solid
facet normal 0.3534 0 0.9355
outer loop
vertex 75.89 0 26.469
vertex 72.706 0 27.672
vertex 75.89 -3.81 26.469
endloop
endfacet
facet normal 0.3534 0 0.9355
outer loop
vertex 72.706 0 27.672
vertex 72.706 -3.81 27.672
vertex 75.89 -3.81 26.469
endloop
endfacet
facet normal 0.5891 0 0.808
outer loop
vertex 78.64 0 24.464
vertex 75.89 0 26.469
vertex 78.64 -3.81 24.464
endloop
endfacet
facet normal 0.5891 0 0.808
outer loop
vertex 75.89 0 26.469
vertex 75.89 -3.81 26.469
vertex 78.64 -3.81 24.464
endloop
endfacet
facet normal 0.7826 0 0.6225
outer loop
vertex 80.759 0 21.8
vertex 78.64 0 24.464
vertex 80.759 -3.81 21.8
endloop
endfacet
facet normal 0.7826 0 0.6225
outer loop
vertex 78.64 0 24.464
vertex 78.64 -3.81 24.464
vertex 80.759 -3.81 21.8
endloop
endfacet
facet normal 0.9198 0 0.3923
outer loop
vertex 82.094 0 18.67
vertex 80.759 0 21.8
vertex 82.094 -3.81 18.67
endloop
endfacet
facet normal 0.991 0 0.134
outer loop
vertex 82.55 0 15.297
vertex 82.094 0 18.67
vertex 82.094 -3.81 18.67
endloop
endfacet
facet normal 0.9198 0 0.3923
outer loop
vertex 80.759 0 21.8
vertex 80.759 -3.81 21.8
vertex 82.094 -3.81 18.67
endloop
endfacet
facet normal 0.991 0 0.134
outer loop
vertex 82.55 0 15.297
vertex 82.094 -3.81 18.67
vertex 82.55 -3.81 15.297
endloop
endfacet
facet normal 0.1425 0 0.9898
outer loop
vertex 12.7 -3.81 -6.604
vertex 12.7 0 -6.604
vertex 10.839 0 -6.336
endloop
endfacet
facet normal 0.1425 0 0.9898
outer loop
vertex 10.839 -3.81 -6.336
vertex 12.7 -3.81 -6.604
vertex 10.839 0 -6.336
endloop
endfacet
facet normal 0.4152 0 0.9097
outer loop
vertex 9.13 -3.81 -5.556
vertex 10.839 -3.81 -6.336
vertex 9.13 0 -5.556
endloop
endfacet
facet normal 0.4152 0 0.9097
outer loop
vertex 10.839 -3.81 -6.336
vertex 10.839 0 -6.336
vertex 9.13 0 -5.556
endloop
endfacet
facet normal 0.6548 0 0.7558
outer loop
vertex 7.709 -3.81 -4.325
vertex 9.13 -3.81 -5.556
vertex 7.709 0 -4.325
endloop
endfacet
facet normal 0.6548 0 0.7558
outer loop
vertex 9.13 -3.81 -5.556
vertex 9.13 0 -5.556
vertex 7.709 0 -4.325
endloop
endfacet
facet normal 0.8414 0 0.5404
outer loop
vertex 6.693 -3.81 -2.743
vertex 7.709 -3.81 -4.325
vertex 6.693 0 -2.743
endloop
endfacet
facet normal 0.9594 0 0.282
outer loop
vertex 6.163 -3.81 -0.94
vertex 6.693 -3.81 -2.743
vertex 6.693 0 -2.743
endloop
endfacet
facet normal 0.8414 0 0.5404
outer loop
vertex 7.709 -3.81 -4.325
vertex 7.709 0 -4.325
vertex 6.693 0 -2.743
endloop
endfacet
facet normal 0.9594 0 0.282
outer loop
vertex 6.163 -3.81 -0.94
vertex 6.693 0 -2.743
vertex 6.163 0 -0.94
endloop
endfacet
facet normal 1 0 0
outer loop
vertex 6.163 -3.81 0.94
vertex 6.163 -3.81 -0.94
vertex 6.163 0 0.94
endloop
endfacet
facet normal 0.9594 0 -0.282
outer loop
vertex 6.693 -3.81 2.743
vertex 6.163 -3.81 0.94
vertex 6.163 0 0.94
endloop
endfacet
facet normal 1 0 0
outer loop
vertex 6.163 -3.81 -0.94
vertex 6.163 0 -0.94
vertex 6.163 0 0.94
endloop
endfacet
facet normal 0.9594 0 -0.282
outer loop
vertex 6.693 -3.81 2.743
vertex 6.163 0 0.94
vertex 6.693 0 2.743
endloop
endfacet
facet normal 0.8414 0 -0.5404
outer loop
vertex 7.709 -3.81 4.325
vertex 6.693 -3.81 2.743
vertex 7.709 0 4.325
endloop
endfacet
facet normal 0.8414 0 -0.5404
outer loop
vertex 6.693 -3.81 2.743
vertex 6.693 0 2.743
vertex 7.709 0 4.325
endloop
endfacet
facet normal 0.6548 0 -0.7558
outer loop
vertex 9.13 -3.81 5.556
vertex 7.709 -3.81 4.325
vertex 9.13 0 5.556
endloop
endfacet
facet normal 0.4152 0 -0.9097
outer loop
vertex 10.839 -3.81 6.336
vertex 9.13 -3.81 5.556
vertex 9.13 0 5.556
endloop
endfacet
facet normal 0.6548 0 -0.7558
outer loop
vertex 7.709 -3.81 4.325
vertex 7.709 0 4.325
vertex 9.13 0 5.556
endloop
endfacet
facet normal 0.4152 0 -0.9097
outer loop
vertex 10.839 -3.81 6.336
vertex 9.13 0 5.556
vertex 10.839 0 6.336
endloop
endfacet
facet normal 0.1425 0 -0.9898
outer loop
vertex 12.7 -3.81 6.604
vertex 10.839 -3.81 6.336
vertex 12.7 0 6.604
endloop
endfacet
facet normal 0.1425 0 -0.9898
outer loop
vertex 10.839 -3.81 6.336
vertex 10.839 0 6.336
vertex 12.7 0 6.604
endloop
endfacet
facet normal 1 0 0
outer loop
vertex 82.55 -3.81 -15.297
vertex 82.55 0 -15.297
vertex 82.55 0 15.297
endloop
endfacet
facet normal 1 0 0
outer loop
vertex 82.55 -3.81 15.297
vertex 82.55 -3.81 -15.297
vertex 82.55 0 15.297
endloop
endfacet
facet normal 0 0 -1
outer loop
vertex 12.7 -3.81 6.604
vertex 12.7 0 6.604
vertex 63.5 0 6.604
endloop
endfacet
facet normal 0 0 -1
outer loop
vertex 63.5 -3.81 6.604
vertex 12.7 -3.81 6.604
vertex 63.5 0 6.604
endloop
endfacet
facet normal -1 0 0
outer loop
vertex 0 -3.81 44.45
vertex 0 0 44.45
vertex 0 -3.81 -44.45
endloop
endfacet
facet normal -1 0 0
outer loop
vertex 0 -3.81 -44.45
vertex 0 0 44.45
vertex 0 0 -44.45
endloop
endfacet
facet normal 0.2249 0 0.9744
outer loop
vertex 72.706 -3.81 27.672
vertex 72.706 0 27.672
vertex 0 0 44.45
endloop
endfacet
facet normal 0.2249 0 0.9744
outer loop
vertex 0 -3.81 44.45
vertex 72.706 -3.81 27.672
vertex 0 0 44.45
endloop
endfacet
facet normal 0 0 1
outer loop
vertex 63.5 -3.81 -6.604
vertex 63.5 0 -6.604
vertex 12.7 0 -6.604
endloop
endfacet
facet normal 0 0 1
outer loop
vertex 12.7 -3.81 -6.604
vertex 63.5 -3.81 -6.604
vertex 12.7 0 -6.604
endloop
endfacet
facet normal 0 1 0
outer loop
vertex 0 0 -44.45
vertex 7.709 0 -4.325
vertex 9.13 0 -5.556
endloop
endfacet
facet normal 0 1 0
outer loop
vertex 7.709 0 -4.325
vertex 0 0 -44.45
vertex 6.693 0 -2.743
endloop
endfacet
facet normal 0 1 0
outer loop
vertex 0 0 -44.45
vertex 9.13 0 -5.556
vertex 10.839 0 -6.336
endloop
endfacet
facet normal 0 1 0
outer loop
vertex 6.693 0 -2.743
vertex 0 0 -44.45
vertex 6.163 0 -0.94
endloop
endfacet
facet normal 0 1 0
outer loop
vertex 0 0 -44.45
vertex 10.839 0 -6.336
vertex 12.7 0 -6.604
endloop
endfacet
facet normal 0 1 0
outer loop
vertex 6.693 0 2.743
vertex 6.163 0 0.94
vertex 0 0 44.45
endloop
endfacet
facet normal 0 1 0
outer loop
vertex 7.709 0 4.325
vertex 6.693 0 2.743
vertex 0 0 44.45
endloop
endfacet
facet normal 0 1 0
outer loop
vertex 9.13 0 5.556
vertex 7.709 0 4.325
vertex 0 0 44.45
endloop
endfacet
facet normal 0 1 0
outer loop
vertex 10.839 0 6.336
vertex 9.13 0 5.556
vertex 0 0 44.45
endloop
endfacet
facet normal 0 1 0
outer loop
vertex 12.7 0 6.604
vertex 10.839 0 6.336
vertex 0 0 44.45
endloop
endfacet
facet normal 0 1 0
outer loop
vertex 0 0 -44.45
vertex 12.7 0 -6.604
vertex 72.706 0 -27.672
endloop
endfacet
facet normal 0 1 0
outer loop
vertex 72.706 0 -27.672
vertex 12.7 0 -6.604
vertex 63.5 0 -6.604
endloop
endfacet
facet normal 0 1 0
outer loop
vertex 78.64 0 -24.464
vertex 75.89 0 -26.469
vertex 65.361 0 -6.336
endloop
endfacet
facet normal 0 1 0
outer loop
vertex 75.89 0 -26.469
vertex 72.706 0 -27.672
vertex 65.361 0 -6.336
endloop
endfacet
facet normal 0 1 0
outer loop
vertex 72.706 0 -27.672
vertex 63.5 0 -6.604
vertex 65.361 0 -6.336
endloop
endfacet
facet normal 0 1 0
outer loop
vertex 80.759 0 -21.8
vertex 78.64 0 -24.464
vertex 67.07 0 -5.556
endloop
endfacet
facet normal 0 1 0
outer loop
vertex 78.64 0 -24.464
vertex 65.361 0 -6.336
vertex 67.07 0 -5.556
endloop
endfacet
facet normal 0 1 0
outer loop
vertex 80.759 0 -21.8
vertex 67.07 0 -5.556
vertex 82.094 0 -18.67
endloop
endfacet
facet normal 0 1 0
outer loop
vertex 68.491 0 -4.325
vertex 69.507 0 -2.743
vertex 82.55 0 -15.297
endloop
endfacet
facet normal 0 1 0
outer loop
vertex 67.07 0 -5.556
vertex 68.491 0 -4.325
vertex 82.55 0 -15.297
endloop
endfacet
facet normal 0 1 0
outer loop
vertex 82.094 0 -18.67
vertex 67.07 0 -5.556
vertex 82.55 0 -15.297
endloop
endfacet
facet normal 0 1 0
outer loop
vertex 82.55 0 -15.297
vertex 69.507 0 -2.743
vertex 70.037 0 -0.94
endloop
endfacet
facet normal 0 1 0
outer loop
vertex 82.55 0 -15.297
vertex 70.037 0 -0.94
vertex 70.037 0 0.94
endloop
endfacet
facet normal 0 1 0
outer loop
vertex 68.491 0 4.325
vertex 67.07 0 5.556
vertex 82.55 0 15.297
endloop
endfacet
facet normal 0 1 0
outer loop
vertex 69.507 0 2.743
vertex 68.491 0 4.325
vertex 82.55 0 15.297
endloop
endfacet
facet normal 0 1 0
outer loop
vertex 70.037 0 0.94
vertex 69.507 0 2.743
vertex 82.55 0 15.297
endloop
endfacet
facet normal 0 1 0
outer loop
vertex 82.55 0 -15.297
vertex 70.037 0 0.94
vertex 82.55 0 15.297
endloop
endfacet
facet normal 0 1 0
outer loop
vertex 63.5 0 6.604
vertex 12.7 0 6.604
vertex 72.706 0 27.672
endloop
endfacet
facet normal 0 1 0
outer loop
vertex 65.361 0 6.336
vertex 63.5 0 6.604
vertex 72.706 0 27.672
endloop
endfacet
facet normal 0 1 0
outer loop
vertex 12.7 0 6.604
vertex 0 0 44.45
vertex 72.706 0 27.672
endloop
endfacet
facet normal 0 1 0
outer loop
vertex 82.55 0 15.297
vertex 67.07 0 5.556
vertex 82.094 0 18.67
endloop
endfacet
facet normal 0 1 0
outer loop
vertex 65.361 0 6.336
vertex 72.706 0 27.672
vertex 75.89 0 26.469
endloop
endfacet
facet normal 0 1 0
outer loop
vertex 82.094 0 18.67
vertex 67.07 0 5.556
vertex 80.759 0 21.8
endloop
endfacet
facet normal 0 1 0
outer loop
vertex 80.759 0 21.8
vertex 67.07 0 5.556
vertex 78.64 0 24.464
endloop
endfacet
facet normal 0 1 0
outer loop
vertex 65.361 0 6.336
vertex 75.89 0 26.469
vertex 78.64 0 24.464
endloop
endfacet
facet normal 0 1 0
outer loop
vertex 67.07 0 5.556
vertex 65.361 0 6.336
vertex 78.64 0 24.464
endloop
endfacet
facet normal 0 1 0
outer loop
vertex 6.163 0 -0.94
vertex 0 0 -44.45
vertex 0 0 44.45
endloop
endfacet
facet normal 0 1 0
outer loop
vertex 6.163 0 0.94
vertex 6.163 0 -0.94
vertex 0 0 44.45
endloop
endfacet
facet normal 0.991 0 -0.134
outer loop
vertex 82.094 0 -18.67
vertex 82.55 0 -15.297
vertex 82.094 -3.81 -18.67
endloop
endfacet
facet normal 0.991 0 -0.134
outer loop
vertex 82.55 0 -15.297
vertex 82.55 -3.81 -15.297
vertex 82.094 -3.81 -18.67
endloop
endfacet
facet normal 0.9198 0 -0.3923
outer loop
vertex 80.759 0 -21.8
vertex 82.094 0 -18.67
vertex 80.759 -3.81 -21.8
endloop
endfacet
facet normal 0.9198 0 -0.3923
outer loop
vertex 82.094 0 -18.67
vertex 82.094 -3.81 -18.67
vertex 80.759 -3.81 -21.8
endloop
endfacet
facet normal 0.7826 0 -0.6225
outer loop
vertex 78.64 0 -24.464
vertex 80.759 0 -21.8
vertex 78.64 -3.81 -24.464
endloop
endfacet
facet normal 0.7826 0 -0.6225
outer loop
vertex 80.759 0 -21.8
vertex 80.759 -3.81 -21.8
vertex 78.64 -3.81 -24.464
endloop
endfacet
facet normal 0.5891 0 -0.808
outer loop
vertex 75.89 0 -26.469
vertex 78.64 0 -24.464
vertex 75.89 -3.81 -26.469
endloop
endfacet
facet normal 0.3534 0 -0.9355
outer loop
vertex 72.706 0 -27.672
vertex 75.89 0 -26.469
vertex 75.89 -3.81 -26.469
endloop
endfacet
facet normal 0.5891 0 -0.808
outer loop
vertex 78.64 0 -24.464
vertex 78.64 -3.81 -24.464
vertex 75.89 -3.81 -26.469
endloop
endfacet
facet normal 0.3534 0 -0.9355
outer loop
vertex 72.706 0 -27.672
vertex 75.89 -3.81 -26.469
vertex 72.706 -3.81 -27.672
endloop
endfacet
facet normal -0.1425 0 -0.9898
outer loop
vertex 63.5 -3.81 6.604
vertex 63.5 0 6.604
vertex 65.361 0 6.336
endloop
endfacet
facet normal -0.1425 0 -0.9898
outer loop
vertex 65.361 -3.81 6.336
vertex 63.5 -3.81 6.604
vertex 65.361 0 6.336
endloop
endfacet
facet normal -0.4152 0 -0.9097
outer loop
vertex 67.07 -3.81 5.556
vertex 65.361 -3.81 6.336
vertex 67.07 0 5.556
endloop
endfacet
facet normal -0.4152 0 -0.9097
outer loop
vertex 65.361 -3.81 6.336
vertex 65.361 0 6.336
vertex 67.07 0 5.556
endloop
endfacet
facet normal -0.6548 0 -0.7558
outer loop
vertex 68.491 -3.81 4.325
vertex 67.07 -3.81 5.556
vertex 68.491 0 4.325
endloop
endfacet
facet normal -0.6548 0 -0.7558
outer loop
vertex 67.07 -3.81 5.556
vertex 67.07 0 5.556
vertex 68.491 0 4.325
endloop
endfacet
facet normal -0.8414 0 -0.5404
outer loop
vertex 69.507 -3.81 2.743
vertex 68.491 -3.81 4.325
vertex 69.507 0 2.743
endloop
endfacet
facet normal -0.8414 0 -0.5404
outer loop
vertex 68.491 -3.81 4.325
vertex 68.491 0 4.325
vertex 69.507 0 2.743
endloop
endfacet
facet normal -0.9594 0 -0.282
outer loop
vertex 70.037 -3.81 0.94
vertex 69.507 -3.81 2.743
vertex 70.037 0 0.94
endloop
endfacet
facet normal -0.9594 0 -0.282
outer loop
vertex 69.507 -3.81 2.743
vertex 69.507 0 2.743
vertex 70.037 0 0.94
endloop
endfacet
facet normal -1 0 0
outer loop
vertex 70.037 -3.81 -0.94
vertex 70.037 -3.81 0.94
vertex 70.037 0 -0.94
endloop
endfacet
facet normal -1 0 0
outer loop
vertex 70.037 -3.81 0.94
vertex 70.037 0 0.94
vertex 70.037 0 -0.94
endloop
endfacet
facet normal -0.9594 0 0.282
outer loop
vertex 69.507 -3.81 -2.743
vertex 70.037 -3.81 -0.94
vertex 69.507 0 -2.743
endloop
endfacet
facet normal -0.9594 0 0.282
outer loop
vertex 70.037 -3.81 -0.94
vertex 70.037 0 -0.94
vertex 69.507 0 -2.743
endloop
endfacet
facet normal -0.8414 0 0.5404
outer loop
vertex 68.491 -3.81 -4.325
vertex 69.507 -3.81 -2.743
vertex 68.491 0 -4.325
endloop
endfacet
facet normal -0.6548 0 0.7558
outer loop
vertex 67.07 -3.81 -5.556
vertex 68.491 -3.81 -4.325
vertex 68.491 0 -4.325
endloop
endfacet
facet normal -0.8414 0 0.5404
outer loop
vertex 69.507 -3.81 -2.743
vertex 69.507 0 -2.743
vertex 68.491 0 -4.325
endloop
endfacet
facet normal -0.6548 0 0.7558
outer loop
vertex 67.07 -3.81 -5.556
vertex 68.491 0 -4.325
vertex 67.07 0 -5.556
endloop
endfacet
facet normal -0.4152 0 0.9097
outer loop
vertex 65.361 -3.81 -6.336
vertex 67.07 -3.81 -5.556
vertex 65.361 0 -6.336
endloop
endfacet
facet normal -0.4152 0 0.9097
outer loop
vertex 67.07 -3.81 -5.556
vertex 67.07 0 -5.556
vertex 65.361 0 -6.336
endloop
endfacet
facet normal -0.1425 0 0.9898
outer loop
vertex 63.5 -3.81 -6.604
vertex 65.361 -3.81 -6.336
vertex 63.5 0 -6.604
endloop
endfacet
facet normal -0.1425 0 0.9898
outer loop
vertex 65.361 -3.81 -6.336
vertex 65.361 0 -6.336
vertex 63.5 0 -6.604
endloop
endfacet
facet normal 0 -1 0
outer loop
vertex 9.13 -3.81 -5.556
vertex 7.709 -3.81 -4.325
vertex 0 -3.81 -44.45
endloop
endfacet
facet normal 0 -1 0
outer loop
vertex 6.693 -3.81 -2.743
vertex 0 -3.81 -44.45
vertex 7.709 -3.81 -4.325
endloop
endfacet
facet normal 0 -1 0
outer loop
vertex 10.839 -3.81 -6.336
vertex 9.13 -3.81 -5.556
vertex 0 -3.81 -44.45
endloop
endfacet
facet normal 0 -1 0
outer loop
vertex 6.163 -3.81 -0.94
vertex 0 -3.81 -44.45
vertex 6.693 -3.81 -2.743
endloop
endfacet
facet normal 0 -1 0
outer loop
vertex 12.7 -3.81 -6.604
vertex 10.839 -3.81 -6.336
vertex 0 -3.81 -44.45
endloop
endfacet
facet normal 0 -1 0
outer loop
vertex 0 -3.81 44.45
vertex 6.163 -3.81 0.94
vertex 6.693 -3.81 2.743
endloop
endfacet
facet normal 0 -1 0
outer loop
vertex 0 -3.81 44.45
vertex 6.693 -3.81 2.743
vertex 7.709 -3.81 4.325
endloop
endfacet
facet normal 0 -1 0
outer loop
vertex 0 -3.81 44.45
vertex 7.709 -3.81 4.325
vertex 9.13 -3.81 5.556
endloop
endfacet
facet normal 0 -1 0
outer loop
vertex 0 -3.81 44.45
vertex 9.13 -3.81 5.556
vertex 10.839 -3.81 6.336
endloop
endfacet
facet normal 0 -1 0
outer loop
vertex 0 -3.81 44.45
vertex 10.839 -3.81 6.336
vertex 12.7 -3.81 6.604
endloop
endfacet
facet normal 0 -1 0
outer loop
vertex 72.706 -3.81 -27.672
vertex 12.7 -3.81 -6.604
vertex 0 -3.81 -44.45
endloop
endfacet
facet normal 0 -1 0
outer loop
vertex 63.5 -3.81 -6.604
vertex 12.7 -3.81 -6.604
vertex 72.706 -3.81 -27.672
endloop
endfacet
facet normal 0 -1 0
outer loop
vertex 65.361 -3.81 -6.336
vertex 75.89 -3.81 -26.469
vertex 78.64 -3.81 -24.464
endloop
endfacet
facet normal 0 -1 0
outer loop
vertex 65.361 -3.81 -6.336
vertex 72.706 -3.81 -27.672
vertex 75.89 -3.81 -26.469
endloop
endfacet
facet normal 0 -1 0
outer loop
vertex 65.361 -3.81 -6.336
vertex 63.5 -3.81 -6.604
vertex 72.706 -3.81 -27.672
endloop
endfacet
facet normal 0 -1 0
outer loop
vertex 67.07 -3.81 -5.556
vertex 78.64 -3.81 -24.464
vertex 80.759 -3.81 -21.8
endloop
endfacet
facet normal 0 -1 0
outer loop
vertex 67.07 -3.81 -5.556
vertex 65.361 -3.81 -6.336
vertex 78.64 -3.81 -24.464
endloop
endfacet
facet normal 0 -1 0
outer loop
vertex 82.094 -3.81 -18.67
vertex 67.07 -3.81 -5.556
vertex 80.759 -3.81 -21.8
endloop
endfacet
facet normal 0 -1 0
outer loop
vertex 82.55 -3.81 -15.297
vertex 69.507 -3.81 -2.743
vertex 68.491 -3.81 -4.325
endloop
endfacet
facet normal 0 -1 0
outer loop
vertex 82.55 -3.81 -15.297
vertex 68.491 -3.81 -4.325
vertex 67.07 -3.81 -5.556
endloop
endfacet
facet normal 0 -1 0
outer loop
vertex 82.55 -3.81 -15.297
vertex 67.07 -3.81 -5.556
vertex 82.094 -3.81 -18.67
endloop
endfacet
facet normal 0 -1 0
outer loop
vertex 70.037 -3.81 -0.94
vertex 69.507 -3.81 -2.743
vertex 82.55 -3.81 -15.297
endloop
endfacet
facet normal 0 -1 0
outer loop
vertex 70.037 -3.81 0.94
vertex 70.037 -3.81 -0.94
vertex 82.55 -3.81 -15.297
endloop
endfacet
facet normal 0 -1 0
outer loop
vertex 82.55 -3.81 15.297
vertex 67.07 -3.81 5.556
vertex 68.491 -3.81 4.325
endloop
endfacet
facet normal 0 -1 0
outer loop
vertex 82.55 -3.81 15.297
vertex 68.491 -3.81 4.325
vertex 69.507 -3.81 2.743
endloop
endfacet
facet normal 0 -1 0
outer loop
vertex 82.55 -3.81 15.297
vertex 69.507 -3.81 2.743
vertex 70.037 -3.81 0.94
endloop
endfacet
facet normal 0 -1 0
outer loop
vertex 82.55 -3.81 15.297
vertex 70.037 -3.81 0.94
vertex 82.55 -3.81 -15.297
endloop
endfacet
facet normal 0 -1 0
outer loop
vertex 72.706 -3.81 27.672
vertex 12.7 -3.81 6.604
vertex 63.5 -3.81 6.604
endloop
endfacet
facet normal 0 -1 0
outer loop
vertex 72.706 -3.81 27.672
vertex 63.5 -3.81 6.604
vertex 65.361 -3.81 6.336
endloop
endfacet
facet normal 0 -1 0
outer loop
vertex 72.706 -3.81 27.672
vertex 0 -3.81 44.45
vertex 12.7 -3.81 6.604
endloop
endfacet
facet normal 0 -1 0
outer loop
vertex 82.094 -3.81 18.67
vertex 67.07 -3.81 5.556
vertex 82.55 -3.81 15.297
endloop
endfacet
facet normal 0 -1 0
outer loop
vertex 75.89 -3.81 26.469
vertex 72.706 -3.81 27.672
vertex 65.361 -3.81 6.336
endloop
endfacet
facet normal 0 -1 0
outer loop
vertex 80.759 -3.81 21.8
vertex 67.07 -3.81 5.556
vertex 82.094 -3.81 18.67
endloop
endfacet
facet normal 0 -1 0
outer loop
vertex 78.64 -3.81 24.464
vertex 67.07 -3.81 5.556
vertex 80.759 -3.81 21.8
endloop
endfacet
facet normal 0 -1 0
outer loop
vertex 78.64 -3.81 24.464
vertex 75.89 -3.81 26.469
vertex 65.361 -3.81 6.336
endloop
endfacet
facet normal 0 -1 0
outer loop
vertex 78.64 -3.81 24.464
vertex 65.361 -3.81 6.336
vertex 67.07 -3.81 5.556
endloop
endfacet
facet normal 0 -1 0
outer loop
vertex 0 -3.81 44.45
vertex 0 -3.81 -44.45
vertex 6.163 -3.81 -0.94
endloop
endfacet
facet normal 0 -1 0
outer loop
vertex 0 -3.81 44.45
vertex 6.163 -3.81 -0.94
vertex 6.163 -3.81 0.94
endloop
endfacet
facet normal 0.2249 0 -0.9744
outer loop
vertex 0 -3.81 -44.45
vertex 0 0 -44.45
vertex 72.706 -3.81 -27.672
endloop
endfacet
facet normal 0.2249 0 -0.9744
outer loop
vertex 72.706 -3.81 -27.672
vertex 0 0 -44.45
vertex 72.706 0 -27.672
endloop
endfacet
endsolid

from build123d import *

# Parameters (mm, degrees)
F1_DEPTH = 3.81
F2_R     = 12.7


with BuildPart() as f1:
    # F0 (on Front) → F1 (new body)
    with BuildSketch(Plane.XZ):
        Polygon((82.55, 25.4), (0, 44.45), (0, -44.45), (82.55, -25.4), align=None)
        with BuildLine():
            ThreePointArc((12.7, -6.604), (6.096, 0), (12.7, 6.604))
            Line((12.7, 6.604), (63.5, 6.604))
            ThreePointArc((63.5, 6.604), (70.104, 0), (63.5, -6.604))
            Line((63.5, -6.604), (12.7, -6.604))
        make_face(mode=Mode.SUBTRACT)
    extrude(amount=F1_DEPTH)

    # F2
    f2_edges = [f1.edges().sort_by_distance(p)[0] for p in [
        (82.55, -1.905, 25.4),
        (82.55, -1.905, -25.4),
    ]]
    fillet(f2_edges, radius=F2_R)


solid = f1.part
